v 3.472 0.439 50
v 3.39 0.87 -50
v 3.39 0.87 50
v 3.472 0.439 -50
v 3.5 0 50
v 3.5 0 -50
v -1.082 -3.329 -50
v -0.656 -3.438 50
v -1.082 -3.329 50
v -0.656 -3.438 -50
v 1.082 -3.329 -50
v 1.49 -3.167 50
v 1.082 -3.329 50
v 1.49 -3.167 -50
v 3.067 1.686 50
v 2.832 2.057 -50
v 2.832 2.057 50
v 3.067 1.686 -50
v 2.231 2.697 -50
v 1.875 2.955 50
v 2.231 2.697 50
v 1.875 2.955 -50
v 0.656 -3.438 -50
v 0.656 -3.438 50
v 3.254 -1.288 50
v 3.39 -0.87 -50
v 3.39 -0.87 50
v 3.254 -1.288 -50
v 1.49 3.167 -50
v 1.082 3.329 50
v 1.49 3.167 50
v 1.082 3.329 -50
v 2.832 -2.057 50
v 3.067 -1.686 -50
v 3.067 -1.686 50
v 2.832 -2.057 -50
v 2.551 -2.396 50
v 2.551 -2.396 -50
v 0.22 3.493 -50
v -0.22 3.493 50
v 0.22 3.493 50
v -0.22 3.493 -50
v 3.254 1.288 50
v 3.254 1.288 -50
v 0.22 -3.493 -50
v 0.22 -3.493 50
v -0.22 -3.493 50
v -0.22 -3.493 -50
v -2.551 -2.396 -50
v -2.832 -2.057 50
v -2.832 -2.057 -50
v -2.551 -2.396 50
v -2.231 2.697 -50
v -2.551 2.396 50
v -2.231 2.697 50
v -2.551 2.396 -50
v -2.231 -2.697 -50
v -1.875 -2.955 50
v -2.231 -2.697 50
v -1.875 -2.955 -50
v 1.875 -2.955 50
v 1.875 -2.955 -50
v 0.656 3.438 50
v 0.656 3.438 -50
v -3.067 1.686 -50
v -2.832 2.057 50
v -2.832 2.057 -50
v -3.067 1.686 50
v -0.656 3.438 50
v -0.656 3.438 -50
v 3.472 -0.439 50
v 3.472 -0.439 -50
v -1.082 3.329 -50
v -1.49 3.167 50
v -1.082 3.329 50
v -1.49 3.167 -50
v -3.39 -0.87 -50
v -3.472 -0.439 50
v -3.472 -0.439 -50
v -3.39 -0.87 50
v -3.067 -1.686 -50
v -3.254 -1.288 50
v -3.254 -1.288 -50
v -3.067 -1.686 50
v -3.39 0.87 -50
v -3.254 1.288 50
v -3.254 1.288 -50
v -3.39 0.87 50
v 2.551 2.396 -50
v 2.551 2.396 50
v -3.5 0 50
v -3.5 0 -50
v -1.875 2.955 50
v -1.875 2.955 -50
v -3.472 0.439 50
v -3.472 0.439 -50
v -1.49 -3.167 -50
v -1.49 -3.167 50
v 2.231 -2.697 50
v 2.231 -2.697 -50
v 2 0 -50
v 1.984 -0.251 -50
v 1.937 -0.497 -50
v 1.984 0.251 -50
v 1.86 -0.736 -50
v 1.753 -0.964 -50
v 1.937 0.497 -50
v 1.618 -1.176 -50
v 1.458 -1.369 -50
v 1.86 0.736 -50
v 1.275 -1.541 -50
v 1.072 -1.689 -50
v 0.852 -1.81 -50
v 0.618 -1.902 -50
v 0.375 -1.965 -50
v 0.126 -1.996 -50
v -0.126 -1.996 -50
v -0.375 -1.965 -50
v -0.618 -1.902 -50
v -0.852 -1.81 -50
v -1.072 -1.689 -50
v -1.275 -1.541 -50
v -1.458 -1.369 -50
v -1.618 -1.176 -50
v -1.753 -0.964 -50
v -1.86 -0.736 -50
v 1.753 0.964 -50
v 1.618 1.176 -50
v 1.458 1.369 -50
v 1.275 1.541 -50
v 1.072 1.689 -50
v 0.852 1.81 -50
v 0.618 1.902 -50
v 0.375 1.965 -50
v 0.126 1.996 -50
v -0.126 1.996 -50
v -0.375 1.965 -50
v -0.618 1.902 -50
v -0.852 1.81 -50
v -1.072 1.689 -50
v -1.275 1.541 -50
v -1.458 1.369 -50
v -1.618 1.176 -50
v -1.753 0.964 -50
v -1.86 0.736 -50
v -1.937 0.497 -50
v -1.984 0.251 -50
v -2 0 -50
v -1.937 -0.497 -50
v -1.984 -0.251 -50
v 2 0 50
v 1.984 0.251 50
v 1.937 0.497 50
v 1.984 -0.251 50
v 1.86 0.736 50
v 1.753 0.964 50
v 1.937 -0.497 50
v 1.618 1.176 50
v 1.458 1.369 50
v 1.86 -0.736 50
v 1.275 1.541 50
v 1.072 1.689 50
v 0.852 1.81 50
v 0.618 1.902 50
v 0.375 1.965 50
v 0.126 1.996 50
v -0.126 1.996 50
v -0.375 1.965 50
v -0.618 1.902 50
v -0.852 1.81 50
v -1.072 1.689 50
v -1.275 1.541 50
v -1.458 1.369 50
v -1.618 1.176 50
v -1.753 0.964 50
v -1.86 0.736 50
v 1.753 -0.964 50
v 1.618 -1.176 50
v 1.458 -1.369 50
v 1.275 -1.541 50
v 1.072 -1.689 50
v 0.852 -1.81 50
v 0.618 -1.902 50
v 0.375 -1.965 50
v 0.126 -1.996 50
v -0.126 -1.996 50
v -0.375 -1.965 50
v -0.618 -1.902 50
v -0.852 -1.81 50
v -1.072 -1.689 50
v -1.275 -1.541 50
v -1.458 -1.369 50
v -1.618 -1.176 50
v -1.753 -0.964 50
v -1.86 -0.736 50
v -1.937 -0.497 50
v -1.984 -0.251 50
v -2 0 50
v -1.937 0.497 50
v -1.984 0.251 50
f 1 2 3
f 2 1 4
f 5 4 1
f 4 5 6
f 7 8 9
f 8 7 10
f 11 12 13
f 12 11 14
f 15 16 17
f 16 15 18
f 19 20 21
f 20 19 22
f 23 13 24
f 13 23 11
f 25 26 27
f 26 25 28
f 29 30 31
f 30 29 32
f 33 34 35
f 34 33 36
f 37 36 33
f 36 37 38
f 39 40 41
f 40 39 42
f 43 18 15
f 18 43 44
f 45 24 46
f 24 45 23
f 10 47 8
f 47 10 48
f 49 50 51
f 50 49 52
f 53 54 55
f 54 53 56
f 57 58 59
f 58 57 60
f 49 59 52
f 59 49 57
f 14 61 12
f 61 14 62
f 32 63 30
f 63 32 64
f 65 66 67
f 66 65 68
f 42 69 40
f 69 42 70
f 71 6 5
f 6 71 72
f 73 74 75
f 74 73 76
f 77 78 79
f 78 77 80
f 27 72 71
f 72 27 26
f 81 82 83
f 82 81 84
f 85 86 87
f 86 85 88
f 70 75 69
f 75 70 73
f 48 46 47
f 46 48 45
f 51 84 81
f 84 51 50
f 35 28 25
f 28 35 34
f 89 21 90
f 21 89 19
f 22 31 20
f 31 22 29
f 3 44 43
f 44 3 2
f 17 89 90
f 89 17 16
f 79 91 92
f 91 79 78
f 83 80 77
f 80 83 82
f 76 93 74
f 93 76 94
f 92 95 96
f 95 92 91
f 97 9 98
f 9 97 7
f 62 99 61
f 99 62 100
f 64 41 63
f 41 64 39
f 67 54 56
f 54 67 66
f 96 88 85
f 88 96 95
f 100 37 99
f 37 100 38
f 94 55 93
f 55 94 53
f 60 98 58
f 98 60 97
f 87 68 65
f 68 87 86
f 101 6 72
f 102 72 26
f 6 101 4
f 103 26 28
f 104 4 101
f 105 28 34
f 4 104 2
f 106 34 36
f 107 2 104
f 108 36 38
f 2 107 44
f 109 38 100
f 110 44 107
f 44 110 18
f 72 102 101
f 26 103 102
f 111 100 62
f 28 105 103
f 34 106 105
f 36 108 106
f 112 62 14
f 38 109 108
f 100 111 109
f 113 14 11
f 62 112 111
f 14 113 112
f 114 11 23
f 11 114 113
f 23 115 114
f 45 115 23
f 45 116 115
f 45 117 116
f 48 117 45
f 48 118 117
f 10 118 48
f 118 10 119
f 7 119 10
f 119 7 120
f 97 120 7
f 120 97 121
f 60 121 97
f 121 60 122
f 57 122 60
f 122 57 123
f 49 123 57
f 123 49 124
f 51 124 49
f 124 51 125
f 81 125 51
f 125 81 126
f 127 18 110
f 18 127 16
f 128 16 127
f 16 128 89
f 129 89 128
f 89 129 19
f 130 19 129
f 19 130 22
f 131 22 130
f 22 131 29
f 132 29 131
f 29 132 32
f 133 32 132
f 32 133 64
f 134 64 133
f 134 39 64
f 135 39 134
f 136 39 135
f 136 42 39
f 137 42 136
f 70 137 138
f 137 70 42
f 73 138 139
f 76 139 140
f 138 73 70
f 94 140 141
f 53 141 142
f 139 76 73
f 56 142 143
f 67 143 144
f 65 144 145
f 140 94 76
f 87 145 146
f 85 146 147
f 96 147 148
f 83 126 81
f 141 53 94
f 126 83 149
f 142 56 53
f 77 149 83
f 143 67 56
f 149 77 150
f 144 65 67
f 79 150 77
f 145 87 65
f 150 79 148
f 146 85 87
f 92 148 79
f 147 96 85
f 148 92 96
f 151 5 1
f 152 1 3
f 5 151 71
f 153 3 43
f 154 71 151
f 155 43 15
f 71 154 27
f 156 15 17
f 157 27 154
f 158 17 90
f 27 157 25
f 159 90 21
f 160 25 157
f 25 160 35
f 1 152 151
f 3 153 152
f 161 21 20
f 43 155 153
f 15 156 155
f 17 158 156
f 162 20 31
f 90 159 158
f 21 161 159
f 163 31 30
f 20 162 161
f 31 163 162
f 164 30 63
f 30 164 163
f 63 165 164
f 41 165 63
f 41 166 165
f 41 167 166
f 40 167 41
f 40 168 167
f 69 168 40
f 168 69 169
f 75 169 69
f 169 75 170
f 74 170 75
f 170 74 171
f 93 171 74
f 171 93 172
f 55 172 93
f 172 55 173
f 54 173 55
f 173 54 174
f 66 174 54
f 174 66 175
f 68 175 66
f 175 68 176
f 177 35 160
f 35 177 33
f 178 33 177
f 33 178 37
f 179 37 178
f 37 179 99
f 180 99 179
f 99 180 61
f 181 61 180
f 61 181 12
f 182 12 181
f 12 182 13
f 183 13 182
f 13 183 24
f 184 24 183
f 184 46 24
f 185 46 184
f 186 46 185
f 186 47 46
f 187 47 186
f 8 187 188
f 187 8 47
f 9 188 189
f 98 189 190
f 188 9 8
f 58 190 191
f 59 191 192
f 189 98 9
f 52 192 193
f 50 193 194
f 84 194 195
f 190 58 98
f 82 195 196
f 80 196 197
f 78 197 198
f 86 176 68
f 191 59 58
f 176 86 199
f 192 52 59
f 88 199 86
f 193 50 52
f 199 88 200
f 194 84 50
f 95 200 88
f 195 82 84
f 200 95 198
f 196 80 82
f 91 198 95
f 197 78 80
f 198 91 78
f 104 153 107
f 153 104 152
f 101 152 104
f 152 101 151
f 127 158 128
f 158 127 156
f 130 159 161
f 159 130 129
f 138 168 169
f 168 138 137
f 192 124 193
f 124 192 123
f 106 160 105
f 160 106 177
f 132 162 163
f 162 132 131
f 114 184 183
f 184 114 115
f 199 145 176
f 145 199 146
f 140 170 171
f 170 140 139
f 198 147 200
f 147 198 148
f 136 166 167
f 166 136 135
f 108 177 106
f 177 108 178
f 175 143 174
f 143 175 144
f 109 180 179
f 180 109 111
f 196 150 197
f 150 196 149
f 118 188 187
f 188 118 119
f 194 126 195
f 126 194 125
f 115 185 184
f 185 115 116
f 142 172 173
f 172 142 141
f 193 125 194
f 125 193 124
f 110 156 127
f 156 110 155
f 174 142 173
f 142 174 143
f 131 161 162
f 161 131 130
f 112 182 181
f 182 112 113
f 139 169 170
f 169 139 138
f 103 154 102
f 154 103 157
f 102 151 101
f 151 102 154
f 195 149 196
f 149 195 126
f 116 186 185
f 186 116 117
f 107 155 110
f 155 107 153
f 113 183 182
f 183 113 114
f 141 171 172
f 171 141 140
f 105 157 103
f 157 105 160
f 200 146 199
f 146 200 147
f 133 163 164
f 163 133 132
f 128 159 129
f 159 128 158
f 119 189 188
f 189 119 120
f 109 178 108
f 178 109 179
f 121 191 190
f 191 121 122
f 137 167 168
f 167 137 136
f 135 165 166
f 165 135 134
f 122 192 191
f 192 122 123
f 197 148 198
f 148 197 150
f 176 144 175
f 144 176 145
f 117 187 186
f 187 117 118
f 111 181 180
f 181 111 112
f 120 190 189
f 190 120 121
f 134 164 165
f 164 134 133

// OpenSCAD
$fn = 50;


difference() {
	union() {
		translate(v = [0, 0, -50.0000000000]) {
			cylinder(h = 100, r = 3.5000000000);
		}
	}
	union() {
		translate(v = [0, 0, -100.0000000000]) {
			cylinder(h = 200, r = 2.0000000000);
		}
	}
}
